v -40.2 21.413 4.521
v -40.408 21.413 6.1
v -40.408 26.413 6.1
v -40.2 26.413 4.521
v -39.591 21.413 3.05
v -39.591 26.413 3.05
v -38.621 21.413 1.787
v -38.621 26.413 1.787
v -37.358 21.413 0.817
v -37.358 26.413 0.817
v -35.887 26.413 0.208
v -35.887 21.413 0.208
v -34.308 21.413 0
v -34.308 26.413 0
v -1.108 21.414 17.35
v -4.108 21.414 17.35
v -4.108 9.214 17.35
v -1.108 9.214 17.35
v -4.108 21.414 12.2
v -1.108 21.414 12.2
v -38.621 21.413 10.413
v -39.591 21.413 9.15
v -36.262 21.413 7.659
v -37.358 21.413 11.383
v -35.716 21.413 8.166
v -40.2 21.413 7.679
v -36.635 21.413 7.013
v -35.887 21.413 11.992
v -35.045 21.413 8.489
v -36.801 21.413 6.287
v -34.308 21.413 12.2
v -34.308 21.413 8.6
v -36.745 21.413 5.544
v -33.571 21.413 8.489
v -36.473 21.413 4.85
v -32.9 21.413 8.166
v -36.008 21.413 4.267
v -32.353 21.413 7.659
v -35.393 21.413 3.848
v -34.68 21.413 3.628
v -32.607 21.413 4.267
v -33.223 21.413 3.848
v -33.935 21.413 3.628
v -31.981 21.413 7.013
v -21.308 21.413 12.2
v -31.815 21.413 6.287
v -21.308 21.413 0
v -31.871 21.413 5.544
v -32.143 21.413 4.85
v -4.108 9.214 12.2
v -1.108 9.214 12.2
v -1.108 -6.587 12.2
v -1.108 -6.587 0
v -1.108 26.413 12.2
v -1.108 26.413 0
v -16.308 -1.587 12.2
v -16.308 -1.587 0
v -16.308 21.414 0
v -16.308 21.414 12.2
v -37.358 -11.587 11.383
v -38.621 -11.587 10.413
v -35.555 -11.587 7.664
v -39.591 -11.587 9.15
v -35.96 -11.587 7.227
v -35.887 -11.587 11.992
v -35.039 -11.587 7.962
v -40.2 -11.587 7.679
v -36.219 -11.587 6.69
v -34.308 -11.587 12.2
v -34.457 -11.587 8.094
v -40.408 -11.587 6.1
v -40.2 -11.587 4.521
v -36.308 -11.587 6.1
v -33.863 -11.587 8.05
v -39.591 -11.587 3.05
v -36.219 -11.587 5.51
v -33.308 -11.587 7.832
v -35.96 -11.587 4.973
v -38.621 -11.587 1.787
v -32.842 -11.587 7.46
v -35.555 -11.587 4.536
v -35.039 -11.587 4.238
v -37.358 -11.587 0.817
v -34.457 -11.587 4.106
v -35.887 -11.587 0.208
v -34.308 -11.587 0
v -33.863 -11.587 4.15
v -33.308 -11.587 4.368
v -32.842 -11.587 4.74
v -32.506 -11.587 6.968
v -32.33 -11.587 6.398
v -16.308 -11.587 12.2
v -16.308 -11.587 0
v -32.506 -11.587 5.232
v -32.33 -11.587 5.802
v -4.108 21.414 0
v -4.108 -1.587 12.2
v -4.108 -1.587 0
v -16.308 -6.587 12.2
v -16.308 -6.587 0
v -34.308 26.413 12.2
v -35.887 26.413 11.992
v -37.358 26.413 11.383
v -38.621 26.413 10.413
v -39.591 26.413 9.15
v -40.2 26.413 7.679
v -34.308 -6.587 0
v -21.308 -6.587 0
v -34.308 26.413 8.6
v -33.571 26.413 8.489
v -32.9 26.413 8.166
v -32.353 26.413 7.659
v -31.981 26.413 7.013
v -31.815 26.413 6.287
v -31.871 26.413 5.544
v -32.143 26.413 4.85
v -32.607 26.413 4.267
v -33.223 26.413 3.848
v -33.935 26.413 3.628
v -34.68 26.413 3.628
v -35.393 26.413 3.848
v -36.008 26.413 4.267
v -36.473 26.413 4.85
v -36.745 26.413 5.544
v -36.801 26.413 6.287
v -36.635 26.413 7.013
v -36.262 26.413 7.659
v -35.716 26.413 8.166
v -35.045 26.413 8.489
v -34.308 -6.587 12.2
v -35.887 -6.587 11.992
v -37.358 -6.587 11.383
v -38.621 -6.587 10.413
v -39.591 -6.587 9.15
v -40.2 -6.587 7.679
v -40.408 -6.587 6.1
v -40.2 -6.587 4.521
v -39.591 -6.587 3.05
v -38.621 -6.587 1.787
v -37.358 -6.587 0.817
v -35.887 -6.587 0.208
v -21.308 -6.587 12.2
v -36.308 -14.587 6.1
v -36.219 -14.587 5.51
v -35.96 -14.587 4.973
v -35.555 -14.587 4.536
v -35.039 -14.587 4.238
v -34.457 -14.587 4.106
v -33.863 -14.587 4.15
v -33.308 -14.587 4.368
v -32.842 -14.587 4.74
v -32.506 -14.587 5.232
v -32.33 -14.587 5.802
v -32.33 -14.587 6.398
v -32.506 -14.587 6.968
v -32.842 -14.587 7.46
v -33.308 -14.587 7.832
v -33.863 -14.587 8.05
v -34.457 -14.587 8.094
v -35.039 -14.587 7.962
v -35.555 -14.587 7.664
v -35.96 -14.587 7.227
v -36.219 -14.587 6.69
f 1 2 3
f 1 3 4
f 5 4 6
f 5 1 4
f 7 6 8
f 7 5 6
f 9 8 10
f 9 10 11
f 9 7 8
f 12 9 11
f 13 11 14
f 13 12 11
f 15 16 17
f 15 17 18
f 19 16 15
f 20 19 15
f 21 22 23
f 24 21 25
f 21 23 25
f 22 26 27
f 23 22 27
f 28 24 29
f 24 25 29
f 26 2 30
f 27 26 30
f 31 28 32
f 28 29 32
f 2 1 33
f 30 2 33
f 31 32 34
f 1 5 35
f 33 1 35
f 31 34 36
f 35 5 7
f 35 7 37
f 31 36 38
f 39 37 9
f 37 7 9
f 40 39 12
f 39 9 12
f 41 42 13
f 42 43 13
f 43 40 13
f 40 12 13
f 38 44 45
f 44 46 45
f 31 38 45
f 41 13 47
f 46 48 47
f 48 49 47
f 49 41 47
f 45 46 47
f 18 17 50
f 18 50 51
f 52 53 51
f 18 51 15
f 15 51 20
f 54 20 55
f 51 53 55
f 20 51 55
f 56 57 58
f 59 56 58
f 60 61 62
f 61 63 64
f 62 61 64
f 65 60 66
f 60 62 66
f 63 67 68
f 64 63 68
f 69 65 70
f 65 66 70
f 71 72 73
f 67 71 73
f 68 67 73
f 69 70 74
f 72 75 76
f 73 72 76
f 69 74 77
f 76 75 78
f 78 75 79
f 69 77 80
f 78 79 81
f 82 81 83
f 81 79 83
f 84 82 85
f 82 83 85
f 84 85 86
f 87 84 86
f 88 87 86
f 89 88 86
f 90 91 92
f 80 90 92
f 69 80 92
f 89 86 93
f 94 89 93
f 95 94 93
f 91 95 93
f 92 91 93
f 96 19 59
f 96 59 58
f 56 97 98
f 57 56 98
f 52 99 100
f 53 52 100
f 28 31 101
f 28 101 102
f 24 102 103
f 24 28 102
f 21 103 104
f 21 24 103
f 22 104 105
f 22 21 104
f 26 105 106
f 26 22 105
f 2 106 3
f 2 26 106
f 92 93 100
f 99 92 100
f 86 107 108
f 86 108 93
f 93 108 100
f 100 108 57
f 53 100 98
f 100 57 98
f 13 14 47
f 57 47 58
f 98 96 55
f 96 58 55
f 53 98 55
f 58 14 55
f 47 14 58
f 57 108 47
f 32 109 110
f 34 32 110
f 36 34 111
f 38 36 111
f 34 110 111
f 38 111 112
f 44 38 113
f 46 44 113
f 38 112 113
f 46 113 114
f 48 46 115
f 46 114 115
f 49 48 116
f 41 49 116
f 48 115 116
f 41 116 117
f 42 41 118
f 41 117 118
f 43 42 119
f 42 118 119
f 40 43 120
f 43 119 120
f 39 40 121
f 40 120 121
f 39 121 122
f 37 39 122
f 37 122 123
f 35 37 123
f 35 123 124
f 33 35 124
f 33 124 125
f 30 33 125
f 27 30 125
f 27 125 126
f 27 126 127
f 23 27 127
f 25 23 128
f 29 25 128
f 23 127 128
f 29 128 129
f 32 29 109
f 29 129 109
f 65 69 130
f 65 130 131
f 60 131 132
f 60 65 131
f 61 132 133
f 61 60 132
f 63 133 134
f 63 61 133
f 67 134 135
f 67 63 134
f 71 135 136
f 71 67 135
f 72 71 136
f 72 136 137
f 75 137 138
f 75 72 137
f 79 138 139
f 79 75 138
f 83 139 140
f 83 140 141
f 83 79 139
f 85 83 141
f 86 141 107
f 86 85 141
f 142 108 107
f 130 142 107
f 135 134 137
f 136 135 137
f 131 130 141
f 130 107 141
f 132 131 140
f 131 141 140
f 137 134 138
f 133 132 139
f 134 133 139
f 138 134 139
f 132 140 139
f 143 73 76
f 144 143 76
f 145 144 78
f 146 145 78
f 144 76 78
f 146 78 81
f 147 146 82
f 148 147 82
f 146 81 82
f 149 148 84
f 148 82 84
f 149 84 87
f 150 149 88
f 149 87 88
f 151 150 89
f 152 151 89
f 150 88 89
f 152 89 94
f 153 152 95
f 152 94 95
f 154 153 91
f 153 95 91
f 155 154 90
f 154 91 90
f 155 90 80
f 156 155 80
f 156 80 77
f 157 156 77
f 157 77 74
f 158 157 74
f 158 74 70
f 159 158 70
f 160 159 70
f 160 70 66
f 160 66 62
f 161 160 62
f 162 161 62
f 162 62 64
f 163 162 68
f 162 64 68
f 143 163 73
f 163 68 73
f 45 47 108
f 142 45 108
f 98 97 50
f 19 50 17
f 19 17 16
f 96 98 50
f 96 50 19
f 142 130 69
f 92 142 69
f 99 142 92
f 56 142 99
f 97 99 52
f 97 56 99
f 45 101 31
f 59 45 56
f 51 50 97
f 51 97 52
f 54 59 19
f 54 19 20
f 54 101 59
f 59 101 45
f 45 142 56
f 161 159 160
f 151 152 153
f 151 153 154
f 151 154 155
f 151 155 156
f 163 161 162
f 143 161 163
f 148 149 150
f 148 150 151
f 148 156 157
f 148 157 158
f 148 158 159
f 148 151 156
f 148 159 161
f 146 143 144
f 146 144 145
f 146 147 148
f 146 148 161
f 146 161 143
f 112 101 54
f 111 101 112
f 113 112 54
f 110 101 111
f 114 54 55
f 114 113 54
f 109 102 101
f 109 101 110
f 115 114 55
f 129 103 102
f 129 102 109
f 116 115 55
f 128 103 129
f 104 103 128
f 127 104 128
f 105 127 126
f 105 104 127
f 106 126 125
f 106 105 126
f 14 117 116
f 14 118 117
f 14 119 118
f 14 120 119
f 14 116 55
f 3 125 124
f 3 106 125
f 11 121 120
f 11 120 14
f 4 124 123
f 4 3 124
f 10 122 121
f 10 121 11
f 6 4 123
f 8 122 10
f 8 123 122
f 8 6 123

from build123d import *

# Parameters (mm, degrees)
BOSS_EXTRUDE1_DEPTH = 12.2
SKETCH4_R           = 2.5
CUT_EXTRUDE1_DEPTH  = 5
CUT_EXTRUDE2_START  = -38
CUT_EXTRUDE2_DEPTH  = 38
SKETCH6_R           = 2
BOSS_EXTRUDE2_DEPTH = 3
SKETCH7_W           = 12.2
SKETCH7_H           = 4.999065242
SKETCH7_H_2         = 5
BOSS_EXTRUDE3_DEPTH = 15.2
BOSS_EXTRUDE5_REACH = 57.477
SKETCH9_W           = 3
SKETCH9_H           = 12.2
SKETCH10_W          = 3
SKETCH10_H          = 12.2
BOSS_EXTRUDE6_DEPTH = 5.15


# Read off the part's stored shape, not the designer's step: Cut-Extrude2
with BuildPart() as part:
    # Sketch3 → Boss-Extrude1 (new body)
    with BuildSketch(Plane.XY):
        Polygon((-40.407881927, 21.413178882), (-21.307881927, 21.413178882), (-21.307881927, -6.586821118), (-40.407881927, -6.586821118), (-40.407881927, -11.586821118), (-16.307881927, -11.586821118), (-16.307881927, 26.413178882), (-40.407881927, 26.413178882), align=None)
    extrude(amount=BOSS_EXTRUDE1_DEPTH)

    # Sketch4 → Cut-Extrude1 (cut)
    with BuildSketch(Plane(origin=(0, 26.413178882, 0), x_dir=(1, 0, 0), z_dir=(0, 1, 0))):
        with Locations(Location((-34.307881927, -6.1, 0), (0, 0, 270))):
            Circle(SKETCH4_R)
    extrude(amount=-CUT_EXTRUDE1_DEPTH, mode=Mode.SUBTRACT)

    # Cut-Extrude2 outline → Cut-Extrude2 (cut)
    with BuildSketch(Plane(origin=(0, 26.413178882, 0), x_dir=(1, 0, 0), z_dir=(0, 1, 0)).offset(CUT_EXTRUDE2_START)):
        with BuildLine():
            Line((-40.407881927, -12.2), (-34.307881927, -12.2))
            ThreePointArc((-34.307881927, -12.2), (-38.621233292, -10.413351365), (-40.407881927, -6.1))
            Line((-40.407881927, -6.1), (-40.407881927, -12.2))
        make_face()
        with BuildLine():
            Line((-40.407881927, 0), (-40.407881927, -6.1))
            ThreePointArc((-40.407881927, -6.1), (-38.621233292, -1.786648635), (-34.307881927, 0))
            Line((-34.307881927, 0), (-40.407881927, 0))
        make_face()
    extrude(amount=CUT_EXTRUDE2_DEPTH, mode=Mode.SUBTRACT)

    # Sketch6 → Boss-Extrude2 (add)
    with BuildSketch(Plane.XZ.offset(11.586821118)):
        with Locations(Location((-34.307881927, 6.1, 0), (0, 0, 180))):
            Circle(SKETCH6_R)
    extrude(amount=BOSS_EXTRUDE2_DEPTH)

    # Sketch7 → Boss-Extrude3 (add)
    with BuildSketch(Plane(origin=(-16.307881927, 0, 0), x_dir=(0, 0, -1), z_dir=(1, 0, 0))):
        with Locations((-6.1, 23.913646261)):
            Rectangle(SKETCH7_W, SKETCH7_H)
        with Locations((-6.1, -4.086821118)):
            Rectangle(SKETCH7_W, SKETCH7_H_2)
    extrude(amount=BOSS_EXTRUDE3_DEPTH)

    # Sketch9 → Boss-Extrude5 (add, up to next)
    with BuildSketch(Plane.XZ.offset(-21.41411364), mode=Mode.PRIVATE) as boss_extrude5_sk1:
        with Locations((-2.607881927, 6.1)):
            Rectangle(SKETCH9_W, SKETCH9_H)
    boss_extrude5_tool1 = extrude(boss_extrude5_sk1.sketch, amount=BOSS_EXTRUDE5_REACH, mode=Mode.PRIVATE) - part.part
    add(boss_extrude5_tool1.solids().sort_by_distance((-2.607882, 21.414114, 6.1))[0])

    # Sketch10 → Boss-Extrude6 (add)
    with BuildSketch(Plane.XY.offset(12.2)):
        with Locations((-2.607881927, 15.31411364)):
            Rectangle(SKETCH10_W, SKETCH10_H)
    extrude(amount=BOSS_EXTRUDE6_DEPTH)


solid = part.part
